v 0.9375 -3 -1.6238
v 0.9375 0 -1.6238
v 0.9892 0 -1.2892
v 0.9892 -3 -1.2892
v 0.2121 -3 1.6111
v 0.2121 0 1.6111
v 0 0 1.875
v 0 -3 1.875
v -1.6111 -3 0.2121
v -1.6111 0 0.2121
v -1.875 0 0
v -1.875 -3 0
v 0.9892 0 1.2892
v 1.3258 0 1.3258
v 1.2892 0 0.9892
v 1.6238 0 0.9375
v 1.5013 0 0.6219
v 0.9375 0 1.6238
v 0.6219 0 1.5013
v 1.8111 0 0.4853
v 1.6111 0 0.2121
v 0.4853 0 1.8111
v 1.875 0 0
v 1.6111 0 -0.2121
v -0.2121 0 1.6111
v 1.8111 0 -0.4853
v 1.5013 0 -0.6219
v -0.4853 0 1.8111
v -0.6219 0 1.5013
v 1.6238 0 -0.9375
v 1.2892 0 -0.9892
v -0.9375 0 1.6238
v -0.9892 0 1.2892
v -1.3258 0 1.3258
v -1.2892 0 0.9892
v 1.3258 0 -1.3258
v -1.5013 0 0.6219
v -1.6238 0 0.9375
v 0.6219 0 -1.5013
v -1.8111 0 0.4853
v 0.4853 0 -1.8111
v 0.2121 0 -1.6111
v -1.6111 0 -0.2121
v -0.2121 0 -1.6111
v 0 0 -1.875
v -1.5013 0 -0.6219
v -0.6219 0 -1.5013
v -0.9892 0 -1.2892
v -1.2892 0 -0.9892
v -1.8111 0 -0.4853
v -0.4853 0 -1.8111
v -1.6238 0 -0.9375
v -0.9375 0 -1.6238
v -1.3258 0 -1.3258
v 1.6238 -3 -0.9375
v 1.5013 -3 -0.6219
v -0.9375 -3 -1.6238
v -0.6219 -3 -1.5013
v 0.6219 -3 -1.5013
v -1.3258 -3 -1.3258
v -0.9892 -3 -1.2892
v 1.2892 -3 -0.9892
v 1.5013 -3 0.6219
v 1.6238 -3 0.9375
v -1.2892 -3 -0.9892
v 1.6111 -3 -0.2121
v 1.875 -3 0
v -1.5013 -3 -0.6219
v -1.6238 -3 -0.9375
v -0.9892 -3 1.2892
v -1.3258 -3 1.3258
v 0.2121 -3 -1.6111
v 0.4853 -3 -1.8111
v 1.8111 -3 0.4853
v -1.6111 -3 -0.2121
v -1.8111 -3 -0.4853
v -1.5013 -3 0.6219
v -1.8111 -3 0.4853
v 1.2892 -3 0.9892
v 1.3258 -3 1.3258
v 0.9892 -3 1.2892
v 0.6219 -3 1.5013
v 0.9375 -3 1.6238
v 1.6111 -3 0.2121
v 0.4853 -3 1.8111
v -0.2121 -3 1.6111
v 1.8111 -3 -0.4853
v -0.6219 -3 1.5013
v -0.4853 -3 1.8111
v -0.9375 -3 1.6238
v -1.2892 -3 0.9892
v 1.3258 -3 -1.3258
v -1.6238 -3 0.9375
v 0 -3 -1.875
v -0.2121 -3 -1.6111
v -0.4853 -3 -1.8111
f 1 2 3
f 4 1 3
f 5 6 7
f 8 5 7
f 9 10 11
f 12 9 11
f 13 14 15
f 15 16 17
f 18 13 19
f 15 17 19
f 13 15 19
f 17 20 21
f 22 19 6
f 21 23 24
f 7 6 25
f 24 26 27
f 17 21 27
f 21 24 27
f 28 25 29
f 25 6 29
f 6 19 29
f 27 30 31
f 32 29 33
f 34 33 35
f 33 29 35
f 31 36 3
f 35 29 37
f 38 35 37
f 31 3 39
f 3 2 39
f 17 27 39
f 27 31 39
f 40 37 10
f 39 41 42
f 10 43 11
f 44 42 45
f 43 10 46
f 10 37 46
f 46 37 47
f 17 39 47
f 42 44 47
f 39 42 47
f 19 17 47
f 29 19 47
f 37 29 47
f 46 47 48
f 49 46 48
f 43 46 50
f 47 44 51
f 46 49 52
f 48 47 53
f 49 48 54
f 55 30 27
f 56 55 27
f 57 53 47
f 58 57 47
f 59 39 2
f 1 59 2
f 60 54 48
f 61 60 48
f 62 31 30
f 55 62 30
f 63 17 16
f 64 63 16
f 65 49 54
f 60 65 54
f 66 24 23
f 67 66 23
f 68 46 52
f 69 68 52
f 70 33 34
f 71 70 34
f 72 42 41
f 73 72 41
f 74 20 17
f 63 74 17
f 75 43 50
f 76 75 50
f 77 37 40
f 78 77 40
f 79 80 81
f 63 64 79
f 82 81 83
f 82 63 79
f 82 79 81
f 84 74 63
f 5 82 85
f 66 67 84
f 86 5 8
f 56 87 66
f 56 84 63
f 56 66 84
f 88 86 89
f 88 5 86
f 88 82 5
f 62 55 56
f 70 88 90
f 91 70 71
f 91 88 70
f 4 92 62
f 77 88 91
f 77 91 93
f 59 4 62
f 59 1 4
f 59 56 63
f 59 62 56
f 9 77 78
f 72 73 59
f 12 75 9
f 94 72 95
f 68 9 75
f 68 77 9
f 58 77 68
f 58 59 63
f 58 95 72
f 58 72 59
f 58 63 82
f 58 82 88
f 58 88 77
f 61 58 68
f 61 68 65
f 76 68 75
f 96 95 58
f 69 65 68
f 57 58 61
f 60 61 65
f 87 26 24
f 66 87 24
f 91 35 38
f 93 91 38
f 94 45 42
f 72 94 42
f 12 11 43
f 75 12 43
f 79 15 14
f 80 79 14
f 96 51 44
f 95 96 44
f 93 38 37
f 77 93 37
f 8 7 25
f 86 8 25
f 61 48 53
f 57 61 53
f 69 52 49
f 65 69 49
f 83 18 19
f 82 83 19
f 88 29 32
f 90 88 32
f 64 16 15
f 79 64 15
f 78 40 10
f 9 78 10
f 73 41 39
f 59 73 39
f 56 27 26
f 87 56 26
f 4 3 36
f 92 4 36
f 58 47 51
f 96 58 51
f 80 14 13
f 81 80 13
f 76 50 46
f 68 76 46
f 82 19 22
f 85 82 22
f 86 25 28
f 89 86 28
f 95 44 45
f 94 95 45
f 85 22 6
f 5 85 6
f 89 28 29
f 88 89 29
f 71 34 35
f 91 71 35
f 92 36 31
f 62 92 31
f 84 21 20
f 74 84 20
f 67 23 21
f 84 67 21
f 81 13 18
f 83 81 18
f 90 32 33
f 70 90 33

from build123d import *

# Parameters (mm, degrees)
BOSS_EXTRUDE1_DEPTH = 3


with BuildPart() as part:
    # Sketch1 → Boss-Extrude1 (new body)
    with BuildSketch(Plane(origin=(0, 0, 0), x_dir=(1, 0, 0), z_dir=(0, 1, 0))):
        Polygon((-0.212105062, 1.6110979), (0, 1.875), (0.212105062, 1.6110979), (0.48528571, 1.811110924), (0.621860578, 1.50130424), (0.9375, 1.623797632), (0.989237322, 1.289199178), (1.325825215, 1.325825215), (1.289199178, 0.989237322), (1.623797632, 0.9375), (1.50130424, 0.621860578), (1.811110924, 0.48528571), (1.6110979, 0.212105062), (1.875, 0), (1.6110979, -0.212105062), (1.811110924, -0.48528571), (1.50130424, -0.621860578), (1.623797632, -0.9375), (1.289199178, -0.989237322), (1.325825215, -1.325825215), (0.989237322, -1.289199178), (0.9375, -1.623797632), (0.621860578, -1.50130424), (0.48528571, -1.811110924), (0.212105062, -1.6110979), (0, -1.875), (-0.212105062, -1.6110979), (-0.48528571, -1.811110924), (-0.621860578, -1.50130424), (-0.9375, -1.623797632), (-0.989237322, -1.289199178), (-1.325825215, -1.325825215), (-1.289199178, -0.989237322), (-1.623797632, -0.9375), (-1.50130424, -0.621860578), (-1.811110924, -0.48528571), (-1.6110979, -0.212105062), (-1.875, 0), (-1.6110979, 0.212105062), (-1.811110924, 0.48528571), (-1.50130424, 0.621860578), (-1.623797632, 0.9375), (-1.289199178, 0.989237322), (-1.325825215, 1.325825215), (-0.989237322, 1.289199178), (-0.9375, 1.623797632), (-0.621860578, 1.50130424), (-0.48528571, 1.811110924), align=None)
    extrude(amount=-BOSS_EXTRUDE1_DEPTH)


solid = part.part
